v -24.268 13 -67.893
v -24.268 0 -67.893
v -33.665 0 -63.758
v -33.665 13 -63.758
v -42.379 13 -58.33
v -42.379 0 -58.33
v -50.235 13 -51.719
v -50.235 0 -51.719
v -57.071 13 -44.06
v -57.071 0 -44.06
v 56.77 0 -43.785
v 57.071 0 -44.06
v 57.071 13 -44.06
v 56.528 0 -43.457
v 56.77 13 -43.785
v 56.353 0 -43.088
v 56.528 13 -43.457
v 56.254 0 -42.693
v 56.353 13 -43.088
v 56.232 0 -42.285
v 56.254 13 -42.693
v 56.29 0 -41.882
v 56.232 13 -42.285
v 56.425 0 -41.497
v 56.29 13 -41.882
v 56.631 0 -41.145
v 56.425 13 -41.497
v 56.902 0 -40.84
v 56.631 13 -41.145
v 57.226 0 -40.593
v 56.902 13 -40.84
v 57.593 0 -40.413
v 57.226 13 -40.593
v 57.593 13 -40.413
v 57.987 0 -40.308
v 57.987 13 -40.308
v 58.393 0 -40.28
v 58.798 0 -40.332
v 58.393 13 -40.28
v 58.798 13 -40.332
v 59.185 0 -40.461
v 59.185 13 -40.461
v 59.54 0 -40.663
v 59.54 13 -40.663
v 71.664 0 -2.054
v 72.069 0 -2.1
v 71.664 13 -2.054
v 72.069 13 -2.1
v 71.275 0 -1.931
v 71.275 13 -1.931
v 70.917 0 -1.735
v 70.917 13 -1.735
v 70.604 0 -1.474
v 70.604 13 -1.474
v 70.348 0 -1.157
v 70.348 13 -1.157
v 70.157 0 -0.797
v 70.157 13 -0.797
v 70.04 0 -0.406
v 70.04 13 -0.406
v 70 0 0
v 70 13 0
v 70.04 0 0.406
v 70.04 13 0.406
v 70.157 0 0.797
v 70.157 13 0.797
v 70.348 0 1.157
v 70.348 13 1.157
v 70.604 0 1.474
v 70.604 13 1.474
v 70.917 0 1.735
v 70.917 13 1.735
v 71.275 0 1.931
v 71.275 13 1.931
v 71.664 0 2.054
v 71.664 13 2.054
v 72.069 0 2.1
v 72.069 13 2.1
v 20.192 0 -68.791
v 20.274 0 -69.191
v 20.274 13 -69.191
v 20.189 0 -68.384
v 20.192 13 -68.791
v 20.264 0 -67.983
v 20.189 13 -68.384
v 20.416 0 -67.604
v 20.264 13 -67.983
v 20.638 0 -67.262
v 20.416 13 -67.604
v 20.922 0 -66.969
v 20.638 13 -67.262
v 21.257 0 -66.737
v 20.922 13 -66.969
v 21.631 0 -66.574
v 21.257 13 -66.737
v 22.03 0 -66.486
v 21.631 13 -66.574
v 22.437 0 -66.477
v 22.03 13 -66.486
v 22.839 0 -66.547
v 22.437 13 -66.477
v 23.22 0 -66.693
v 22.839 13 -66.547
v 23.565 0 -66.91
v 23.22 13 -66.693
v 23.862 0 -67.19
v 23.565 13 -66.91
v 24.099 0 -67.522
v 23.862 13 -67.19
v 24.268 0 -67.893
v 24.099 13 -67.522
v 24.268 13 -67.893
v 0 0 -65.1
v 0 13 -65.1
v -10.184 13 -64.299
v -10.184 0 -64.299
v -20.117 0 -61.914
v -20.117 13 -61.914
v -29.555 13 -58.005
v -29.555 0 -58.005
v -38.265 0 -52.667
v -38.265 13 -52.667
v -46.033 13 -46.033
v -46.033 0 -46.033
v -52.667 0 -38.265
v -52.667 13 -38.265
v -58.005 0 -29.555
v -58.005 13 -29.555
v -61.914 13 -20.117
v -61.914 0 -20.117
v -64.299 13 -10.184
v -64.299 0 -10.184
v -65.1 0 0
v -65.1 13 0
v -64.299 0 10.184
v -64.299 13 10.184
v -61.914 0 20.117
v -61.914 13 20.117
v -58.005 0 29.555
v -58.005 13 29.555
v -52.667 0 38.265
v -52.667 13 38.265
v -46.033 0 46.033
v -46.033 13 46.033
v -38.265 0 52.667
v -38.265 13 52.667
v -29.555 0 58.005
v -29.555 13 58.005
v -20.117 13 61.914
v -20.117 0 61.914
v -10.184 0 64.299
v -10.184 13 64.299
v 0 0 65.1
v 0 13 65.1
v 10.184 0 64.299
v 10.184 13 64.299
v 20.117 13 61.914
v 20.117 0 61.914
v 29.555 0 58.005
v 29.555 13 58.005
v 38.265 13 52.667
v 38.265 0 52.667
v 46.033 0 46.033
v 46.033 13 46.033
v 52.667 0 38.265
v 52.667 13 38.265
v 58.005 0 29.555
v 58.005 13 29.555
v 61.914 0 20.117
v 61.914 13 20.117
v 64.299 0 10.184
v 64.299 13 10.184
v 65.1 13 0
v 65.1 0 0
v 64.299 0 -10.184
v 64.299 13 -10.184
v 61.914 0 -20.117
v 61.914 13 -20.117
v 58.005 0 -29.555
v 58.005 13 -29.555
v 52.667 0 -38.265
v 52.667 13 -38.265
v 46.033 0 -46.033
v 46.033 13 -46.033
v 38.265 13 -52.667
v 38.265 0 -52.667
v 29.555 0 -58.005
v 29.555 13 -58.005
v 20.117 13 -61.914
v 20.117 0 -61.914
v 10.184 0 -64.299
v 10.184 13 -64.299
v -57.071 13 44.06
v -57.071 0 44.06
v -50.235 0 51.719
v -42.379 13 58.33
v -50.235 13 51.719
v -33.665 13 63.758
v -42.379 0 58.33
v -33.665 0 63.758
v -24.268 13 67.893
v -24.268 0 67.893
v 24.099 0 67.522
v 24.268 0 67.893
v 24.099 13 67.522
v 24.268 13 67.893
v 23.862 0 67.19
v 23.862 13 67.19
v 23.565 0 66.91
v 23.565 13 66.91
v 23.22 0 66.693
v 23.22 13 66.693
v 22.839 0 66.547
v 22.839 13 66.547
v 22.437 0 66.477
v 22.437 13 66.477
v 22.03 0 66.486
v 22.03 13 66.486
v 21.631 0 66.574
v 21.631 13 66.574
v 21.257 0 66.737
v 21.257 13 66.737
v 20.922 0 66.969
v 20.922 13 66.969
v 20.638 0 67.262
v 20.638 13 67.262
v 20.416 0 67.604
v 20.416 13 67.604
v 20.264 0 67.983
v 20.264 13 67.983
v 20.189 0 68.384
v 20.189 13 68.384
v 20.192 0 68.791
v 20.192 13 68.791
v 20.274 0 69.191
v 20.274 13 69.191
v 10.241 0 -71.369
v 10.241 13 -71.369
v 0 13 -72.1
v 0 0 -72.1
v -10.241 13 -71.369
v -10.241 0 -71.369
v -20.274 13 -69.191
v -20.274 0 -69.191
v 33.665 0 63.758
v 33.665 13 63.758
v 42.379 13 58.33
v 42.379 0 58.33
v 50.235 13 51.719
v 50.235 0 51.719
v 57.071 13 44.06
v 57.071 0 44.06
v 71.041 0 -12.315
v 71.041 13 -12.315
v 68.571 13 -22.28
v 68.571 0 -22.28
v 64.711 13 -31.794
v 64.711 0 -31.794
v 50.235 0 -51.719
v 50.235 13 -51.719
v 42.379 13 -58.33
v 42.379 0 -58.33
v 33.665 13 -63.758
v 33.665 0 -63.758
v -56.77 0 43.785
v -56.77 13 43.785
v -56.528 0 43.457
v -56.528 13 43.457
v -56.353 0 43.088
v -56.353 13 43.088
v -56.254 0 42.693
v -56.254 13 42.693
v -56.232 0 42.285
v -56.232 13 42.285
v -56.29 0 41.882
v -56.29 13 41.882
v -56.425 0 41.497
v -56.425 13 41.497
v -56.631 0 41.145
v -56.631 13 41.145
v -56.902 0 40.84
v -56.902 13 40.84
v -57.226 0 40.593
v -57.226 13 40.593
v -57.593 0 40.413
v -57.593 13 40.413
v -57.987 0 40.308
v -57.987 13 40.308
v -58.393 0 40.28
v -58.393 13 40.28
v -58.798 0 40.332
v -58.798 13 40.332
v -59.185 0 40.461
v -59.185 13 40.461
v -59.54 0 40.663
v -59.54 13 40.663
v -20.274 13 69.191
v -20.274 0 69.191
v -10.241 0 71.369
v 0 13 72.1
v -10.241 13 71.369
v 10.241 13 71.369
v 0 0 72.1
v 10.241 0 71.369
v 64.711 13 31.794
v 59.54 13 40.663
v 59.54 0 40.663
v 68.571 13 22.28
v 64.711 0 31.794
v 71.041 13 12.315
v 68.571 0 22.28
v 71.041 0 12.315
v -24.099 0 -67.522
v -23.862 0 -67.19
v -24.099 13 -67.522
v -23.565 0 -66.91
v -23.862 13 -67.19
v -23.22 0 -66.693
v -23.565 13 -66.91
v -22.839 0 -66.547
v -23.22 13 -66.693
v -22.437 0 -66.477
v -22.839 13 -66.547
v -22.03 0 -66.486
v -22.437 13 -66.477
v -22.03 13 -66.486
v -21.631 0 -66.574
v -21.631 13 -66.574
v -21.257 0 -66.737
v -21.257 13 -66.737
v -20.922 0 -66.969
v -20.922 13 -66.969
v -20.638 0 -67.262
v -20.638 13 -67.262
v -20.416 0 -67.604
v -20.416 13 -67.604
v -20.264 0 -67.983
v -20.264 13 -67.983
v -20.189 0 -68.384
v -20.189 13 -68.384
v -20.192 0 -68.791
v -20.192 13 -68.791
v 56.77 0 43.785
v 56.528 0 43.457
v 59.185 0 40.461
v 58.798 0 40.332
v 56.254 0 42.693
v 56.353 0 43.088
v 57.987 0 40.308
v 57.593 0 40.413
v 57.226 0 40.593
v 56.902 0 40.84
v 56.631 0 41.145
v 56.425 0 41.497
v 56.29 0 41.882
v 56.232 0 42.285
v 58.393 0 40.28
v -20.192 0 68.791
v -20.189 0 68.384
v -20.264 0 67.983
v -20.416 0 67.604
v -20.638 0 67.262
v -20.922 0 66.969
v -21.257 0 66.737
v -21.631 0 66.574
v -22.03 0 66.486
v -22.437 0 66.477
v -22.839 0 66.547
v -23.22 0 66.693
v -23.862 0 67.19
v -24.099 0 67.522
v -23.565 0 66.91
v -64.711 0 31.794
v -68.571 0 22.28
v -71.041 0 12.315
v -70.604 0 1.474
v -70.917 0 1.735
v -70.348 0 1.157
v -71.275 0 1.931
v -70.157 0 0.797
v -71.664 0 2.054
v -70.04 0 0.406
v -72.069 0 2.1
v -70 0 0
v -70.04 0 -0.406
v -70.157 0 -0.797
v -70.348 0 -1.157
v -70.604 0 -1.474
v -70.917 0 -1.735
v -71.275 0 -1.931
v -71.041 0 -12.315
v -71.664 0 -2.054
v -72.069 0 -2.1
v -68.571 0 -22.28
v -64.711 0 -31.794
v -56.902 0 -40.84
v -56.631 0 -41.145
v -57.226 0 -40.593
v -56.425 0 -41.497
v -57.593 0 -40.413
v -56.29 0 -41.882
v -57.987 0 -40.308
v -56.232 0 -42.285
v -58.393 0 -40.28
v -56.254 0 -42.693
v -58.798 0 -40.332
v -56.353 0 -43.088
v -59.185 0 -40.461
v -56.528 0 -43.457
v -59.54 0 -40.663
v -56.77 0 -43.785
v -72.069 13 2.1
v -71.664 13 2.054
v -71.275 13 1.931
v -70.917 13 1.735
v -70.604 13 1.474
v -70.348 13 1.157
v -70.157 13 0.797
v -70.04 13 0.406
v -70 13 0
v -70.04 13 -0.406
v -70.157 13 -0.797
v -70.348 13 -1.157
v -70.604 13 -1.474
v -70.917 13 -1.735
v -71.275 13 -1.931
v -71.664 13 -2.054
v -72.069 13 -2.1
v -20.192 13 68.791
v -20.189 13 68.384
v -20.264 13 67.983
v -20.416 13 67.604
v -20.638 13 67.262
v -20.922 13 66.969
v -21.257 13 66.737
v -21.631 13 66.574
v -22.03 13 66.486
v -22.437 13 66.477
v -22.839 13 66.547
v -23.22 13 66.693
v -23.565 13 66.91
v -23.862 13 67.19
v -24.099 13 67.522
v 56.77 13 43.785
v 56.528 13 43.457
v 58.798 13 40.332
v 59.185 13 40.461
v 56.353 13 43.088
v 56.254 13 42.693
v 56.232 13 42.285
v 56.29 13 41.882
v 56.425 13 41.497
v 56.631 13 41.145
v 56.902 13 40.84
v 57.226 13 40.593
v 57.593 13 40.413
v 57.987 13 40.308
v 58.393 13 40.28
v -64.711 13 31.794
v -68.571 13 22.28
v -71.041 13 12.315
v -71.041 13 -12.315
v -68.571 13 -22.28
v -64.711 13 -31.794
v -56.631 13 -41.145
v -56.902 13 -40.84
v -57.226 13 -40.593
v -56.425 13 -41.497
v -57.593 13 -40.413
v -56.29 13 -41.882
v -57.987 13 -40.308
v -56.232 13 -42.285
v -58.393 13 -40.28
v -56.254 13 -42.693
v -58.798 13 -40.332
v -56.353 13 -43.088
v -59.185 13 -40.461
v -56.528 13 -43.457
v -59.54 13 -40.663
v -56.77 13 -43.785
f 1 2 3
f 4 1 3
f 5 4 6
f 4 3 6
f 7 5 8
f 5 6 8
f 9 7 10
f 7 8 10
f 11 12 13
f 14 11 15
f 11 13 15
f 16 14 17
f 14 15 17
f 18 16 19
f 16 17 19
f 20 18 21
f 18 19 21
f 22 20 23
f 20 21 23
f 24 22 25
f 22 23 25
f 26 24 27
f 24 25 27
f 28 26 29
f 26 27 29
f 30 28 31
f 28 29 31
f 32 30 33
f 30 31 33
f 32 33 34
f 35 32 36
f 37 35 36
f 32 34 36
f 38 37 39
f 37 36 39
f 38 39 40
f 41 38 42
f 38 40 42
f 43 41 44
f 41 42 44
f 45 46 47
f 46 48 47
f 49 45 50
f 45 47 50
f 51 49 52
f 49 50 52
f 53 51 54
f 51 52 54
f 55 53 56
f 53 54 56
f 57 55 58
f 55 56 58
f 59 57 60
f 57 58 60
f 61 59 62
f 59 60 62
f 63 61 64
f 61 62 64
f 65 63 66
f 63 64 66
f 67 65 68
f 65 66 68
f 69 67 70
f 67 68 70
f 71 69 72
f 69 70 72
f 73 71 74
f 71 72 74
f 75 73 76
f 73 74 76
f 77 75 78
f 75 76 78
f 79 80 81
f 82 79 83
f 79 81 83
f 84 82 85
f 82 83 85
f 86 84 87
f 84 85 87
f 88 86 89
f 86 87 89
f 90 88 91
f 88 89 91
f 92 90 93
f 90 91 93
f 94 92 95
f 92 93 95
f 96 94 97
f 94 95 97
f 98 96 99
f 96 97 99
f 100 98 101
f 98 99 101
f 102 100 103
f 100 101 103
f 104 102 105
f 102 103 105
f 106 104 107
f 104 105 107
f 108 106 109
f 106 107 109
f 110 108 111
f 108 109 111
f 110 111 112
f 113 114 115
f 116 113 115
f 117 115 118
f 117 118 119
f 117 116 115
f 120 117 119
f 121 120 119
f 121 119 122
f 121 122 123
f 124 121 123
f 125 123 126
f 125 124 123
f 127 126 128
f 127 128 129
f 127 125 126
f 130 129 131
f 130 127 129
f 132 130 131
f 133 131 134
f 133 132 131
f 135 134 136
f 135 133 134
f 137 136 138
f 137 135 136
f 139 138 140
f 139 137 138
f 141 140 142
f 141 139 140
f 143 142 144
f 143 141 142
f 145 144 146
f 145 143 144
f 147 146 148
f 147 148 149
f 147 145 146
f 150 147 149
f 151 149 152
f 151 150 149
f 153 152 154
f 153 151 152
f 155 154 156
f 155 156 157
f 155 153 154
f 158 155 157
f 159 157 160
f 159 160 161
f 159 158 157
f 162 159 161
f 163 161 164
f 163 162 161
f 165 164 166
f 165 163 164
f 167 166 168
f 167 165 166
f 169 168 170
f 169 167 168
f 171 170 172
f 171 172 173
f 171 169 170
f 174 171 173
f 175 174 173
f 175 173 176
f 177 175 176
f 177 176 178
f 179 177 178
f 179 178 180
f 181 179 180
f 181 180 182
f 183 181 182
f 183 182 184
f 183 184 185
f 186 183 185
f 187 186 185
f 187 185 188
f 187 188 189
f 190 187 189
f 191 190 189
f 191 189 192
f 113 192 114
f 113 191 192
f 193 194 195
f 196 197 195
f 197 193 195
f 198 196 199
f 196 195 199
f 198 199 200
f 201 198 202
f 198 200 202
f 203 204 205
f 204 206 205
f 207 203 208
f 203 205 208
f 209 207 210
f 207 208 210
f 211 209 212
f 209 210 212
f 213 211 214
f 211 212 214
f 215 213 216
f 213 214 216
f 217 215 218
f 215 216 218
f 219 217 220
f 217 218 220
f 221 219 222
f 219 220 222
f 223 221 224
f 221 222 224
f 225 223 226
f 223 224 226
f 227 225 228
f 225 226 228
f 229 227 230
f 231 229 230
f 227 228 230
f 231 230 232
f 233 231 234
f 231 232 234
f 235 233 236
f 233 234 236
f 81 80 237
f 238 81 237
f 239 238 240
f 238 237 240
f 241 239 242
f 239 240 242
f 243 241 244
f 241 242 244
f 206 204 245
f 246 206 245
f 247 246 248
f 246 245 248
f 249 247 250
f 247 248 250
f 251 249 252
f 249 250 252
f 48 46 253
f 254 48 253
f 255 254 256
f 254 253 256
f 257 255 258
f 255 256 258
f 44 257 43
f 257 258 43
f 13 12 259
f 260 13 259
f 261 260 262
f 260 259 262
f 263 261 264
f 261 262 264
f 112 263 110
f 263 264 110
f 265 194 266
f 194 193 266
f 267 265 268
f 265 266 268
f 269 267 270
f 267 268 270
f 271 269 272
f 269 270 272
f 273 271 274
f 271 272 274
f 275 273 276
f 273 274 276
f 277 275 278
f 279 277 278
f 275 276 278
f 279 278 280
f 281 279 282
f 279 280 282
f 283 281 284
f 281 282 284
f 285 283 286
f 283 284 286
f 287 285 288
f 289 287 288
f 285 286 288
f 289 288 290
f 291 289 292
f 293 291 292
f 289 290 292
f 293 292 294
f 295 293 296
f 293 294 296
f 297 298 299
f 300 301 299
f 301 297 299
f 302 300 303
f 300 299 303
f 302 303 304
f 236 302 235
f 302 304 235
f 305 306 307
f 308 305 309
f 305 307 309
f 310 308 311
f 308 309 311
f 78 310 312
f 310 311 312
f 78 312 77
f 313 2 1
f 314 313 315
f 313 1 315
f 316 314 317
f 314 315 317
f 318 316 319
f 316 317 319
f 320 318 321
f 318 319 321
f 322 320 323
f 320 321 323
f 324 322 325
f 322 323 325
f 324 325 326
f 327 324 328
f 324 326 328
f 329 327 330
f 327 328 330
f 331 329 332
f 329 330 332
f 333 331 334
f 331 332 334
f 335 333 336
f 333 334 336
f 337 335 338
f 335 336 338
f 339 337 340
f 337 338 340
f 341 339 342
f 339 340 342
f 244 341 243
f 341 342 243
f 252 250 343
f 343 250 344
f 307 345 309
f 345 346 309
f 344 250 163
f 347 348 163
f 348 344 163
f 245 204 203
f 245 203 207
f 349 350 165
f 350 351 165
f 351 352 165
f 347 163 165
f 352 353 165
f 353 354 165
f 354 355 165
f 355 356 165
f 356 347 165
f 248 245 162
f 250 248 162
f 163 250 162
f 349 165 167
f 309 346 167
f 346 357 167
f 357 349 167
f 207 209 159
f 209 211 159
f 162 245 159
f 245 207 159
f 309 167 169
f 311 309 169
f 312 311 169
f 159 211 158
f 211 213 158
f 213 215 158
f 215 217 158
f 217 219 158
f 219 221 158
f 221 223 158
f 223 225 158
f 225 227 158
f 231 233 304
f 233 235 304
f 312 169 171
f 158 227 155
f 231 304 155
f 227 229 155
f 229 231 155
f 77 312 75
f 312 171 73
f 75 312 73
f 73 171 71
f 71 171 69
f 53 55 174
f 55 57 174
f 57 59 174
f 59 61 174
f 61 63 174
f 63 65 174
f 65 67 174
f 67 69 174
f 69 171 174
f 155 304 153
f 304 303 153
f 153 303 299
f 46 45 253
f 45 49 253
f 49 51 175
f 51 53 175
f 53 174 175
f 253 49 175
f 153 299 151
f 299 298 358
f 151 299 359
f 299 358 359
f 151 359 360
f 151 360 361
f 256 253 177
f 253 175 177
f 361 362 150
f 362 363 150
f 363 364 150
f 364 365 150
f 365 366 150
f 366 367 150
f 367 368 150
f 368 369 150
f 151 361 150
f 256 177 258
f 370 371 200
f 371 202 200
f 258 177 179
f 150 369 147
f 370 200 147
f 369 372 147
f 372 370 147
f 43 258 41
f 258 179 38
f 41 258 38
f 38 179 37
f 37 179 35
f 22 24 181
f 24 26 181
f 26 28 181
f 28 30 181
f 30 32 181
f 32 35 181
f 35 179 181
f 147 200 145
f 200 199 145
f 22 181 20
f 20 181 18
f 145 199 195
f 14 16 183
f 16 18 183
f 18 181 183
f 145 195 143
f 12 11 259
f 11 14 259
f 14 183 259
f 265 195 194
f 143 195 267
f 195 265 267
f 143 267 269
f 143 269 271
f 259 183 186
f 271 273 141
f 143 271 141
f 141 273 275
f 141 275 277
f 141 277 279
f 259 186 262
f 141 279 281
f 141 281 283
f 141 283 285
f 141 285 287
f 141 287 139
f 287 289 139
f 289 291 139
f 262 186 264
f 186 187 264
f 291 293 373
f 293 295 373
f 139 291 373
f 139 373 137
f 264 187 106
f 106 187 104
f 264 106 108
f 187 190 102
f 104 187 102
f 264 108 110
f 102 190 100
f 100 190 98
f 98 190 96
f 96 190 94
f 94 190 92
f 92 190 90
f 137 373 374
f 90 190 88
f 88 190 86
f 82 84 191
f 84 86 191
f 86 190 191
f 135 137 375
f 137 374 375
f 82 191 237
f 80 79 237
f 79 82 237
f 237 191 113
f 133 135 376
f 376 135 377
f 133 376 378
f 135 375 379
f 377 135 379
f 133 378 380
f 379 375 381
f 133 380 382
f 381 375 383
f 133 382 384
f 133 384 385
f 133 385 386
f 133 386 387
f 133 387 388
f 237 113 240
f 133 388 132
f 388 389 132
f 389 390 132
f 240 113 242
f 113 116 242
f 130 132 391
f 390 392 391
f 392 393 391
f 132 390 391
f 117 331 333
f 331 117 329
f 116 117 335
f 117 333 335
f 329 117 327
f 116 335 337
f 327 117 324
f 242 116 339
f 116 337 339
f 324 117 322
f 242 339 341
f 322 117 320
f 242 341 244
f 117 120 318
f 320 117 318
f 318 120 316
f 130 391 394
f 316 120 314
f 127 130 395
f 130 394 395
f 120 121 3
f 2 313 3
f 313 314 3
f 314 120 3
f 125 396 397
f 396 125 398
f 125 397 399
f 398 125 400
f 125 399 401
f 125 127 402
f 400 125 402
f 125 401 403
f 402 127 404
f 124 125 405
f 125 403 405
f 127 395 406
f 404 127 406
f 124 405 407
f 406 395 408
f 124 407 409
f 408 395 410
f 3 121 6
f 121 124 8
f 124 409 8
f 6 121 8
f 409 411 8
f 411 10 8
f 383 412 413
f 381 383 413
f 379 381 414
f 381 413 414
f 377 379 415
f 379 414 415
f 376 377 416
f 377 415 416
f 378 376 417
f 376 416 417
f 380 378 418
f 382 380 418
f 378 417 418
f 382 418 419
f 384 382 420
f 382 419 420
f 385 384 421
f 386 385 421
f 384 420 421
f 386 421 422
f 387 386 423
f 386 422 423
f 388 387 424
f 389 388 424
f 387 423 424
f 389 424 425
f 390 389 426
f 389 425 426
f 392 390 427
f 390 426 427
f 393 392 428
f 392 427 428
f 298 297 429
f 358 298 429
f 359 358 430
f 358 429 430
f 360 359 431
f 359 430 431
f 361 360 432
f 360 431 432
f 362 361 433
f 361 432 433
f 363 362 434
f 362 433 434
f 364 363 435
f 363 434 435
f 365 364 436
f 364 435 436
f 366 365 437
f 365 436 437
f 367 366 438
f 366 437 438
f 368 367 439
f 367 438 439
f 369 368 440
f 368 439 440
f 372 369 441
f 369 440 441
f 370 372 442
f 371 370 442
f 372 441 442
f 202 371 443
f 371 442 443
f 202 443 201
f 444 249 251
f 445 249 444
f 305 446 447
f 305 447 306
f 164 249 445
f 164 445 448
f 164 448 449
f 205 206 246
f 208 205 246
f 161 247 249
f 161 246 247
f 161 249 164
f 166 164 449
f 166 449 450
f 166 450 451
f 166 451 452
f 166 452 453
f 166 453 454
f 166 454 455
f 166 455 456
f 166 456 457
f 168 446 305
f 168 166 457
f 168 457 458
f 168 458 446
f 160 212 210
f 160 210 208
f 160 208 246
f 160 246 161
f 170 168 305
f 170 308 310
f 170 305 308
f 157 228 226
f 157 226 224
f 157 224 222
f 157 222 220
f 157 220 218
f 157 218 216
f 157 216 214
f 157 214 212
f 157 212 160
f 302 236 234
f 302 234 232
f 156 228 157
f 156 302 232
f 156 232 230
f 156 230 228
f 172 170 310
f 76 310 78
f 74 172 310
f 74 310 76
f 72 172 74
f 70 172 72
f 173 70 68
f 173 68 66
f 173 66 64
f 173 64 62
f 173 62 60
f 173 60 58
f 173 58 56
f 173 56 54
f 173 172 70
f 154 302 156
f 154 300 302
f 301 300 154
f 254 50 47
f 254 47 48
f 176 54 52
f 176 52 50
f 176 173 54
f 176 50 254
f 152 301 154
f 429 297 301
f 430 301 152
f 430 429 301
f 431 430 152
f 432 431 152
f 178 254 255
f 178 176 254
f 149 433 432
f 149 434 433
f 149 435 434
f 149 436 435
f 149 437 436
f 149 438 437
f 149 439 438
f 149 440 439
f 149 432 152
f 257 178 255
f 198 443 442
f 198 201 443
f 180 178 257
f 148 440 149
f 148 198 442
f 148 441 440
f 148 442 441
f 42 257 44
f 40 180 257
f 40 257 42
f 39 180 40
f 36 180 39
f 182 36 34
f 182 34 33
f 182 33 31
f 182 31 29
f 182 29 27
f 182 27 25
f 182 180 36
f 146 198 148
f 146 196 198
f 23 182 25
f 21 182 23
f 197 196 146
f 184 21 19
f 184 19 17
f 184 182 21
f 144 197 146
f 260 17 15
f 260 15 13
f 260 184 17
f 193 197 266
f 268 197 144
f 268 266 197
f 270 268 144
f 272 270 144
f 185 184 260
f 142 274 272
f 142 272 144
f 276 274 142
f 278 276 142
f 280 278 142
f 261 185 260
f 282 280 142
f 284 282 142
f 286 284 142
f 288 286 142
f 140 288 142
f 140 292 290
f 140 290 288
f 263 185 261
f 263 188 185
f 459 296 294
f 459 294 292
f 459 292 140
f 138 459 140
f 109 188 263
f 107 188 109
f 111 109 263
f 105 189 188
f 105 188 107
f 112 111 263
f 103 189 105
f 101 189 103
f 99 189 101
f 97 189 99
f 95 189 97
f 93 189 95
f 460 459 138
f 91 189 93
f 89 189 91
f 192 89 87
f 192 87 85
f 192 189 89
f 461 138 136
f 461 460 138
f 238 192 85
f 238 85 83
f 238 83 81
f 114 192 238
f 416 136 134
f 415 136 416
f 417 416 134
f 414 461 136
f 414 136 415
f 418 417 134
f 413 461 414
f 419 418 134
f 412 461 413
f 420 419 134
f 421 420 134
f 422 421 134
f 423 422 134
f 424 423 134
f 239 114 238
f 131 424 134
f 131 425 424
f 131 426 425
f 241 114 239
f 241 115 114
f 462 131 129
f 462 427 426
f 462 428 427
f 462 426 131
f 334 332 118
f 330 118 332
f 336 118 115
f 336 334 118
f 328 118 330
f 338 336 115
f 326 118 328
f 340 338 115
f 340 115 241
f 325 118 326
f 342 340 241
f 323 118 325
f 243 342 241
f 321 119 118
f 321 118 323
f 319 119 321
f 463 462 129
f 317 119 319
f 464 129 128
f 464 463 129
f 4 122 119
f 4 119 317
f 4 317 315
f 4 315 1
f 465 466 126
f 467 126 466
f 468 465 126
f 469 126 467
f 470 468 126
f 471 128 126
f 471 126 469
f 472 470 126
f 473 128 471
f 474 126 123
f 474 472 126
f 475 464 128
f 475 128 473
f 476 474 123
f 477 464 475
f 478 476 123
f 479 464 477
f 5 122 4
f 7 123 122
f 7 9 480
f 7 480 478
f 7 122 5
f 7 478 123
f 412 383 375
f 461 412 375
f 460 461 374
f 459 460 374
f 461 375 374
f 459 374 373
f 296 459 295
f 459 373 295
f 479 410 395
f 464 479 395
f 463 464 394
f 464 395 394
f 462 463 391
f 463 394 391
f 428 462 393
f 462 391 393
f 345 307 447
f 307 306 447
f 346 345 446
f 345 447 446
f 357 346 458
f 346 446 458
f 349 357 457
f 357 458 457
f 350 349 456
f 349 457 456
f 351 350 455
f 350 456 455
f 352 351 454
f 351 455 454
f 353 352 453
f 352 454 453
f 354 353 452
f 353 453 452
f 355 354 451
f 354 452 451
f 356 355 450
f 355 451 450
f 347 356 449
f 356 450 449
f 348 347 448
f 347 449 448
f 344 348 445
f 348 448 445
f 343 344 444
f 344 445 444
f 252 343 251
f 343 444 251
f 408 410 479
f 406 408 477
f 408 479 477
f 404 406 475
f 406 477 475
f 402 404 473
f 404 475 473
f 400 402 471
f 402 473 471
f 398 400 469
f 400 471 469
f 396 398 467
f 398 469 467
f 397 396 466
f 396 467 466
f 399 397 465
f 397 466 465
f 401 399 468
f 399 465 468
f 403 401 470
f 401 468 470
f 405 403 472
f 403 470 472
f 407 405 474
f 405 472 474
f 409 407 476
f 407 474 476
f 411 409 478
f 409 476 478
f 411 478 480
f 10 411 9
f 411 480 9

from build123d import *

# Parameters (mm, degrees)
SKETCH_1_R               = 72.1
SKETCH_1_R_2             = 65.1
EXTRUDE_1_DEPTH          = 13
SKETCH_2_R               = 2.1
CUT_EXTRUDE_1_DEPTH      = 13
PATTERN_CIRCULAR_1_COUNT = 10


with BuildPart() as part:
    # 草图1 → 凸台-拉伸1 (new body)
    with BuildSketch(Plane(origin=(0, 0, 0), x_dir=(1, 0, 0), z_dir=(0, 1, 0))):
        with Locations(Location((0, 0, 0), (0, 0, 90))):
            Circle(SKETCH_1_R)
        with Locations(Location((0, 0, 0), (0, 0, 90))):
            Circle(SKETCH_1_R_2, mode=Mode.SUBTRACT)
    extrude(amount=EXTRUDE_1_DEPTH)

    # 草图2 → 切除-拉伸1 (cut)
    with BuildSketch(Plane(origin=(0, 13, 0), x_dir=(1, 0, 0), z_dir=(0, 1, 0))):
        with Locations((-72.1, 0)):
            Circle(SKETCH_2_R)
    cut_extrude_1 = extrude(amount=-CUT_EXTRUDE_1_DEPTH, mode=Mode.SUBTRACT)

    # 阵列(圆周)1: 切除-拉伸1 ×10 about axis
    pattern_circular_1_axis = Axis((0, 0, 0), (0, 1, 0))
    for i in range(1, PATTERN_CIRCULAR_1_COUNT):
        add(cut_extrude_1.rotate(pattern_circular_1_axis, i * 360 / PATTERN_CIRCULAR_1_COUNT), mode=Mode.SUBTRACT)


solid = part.part
